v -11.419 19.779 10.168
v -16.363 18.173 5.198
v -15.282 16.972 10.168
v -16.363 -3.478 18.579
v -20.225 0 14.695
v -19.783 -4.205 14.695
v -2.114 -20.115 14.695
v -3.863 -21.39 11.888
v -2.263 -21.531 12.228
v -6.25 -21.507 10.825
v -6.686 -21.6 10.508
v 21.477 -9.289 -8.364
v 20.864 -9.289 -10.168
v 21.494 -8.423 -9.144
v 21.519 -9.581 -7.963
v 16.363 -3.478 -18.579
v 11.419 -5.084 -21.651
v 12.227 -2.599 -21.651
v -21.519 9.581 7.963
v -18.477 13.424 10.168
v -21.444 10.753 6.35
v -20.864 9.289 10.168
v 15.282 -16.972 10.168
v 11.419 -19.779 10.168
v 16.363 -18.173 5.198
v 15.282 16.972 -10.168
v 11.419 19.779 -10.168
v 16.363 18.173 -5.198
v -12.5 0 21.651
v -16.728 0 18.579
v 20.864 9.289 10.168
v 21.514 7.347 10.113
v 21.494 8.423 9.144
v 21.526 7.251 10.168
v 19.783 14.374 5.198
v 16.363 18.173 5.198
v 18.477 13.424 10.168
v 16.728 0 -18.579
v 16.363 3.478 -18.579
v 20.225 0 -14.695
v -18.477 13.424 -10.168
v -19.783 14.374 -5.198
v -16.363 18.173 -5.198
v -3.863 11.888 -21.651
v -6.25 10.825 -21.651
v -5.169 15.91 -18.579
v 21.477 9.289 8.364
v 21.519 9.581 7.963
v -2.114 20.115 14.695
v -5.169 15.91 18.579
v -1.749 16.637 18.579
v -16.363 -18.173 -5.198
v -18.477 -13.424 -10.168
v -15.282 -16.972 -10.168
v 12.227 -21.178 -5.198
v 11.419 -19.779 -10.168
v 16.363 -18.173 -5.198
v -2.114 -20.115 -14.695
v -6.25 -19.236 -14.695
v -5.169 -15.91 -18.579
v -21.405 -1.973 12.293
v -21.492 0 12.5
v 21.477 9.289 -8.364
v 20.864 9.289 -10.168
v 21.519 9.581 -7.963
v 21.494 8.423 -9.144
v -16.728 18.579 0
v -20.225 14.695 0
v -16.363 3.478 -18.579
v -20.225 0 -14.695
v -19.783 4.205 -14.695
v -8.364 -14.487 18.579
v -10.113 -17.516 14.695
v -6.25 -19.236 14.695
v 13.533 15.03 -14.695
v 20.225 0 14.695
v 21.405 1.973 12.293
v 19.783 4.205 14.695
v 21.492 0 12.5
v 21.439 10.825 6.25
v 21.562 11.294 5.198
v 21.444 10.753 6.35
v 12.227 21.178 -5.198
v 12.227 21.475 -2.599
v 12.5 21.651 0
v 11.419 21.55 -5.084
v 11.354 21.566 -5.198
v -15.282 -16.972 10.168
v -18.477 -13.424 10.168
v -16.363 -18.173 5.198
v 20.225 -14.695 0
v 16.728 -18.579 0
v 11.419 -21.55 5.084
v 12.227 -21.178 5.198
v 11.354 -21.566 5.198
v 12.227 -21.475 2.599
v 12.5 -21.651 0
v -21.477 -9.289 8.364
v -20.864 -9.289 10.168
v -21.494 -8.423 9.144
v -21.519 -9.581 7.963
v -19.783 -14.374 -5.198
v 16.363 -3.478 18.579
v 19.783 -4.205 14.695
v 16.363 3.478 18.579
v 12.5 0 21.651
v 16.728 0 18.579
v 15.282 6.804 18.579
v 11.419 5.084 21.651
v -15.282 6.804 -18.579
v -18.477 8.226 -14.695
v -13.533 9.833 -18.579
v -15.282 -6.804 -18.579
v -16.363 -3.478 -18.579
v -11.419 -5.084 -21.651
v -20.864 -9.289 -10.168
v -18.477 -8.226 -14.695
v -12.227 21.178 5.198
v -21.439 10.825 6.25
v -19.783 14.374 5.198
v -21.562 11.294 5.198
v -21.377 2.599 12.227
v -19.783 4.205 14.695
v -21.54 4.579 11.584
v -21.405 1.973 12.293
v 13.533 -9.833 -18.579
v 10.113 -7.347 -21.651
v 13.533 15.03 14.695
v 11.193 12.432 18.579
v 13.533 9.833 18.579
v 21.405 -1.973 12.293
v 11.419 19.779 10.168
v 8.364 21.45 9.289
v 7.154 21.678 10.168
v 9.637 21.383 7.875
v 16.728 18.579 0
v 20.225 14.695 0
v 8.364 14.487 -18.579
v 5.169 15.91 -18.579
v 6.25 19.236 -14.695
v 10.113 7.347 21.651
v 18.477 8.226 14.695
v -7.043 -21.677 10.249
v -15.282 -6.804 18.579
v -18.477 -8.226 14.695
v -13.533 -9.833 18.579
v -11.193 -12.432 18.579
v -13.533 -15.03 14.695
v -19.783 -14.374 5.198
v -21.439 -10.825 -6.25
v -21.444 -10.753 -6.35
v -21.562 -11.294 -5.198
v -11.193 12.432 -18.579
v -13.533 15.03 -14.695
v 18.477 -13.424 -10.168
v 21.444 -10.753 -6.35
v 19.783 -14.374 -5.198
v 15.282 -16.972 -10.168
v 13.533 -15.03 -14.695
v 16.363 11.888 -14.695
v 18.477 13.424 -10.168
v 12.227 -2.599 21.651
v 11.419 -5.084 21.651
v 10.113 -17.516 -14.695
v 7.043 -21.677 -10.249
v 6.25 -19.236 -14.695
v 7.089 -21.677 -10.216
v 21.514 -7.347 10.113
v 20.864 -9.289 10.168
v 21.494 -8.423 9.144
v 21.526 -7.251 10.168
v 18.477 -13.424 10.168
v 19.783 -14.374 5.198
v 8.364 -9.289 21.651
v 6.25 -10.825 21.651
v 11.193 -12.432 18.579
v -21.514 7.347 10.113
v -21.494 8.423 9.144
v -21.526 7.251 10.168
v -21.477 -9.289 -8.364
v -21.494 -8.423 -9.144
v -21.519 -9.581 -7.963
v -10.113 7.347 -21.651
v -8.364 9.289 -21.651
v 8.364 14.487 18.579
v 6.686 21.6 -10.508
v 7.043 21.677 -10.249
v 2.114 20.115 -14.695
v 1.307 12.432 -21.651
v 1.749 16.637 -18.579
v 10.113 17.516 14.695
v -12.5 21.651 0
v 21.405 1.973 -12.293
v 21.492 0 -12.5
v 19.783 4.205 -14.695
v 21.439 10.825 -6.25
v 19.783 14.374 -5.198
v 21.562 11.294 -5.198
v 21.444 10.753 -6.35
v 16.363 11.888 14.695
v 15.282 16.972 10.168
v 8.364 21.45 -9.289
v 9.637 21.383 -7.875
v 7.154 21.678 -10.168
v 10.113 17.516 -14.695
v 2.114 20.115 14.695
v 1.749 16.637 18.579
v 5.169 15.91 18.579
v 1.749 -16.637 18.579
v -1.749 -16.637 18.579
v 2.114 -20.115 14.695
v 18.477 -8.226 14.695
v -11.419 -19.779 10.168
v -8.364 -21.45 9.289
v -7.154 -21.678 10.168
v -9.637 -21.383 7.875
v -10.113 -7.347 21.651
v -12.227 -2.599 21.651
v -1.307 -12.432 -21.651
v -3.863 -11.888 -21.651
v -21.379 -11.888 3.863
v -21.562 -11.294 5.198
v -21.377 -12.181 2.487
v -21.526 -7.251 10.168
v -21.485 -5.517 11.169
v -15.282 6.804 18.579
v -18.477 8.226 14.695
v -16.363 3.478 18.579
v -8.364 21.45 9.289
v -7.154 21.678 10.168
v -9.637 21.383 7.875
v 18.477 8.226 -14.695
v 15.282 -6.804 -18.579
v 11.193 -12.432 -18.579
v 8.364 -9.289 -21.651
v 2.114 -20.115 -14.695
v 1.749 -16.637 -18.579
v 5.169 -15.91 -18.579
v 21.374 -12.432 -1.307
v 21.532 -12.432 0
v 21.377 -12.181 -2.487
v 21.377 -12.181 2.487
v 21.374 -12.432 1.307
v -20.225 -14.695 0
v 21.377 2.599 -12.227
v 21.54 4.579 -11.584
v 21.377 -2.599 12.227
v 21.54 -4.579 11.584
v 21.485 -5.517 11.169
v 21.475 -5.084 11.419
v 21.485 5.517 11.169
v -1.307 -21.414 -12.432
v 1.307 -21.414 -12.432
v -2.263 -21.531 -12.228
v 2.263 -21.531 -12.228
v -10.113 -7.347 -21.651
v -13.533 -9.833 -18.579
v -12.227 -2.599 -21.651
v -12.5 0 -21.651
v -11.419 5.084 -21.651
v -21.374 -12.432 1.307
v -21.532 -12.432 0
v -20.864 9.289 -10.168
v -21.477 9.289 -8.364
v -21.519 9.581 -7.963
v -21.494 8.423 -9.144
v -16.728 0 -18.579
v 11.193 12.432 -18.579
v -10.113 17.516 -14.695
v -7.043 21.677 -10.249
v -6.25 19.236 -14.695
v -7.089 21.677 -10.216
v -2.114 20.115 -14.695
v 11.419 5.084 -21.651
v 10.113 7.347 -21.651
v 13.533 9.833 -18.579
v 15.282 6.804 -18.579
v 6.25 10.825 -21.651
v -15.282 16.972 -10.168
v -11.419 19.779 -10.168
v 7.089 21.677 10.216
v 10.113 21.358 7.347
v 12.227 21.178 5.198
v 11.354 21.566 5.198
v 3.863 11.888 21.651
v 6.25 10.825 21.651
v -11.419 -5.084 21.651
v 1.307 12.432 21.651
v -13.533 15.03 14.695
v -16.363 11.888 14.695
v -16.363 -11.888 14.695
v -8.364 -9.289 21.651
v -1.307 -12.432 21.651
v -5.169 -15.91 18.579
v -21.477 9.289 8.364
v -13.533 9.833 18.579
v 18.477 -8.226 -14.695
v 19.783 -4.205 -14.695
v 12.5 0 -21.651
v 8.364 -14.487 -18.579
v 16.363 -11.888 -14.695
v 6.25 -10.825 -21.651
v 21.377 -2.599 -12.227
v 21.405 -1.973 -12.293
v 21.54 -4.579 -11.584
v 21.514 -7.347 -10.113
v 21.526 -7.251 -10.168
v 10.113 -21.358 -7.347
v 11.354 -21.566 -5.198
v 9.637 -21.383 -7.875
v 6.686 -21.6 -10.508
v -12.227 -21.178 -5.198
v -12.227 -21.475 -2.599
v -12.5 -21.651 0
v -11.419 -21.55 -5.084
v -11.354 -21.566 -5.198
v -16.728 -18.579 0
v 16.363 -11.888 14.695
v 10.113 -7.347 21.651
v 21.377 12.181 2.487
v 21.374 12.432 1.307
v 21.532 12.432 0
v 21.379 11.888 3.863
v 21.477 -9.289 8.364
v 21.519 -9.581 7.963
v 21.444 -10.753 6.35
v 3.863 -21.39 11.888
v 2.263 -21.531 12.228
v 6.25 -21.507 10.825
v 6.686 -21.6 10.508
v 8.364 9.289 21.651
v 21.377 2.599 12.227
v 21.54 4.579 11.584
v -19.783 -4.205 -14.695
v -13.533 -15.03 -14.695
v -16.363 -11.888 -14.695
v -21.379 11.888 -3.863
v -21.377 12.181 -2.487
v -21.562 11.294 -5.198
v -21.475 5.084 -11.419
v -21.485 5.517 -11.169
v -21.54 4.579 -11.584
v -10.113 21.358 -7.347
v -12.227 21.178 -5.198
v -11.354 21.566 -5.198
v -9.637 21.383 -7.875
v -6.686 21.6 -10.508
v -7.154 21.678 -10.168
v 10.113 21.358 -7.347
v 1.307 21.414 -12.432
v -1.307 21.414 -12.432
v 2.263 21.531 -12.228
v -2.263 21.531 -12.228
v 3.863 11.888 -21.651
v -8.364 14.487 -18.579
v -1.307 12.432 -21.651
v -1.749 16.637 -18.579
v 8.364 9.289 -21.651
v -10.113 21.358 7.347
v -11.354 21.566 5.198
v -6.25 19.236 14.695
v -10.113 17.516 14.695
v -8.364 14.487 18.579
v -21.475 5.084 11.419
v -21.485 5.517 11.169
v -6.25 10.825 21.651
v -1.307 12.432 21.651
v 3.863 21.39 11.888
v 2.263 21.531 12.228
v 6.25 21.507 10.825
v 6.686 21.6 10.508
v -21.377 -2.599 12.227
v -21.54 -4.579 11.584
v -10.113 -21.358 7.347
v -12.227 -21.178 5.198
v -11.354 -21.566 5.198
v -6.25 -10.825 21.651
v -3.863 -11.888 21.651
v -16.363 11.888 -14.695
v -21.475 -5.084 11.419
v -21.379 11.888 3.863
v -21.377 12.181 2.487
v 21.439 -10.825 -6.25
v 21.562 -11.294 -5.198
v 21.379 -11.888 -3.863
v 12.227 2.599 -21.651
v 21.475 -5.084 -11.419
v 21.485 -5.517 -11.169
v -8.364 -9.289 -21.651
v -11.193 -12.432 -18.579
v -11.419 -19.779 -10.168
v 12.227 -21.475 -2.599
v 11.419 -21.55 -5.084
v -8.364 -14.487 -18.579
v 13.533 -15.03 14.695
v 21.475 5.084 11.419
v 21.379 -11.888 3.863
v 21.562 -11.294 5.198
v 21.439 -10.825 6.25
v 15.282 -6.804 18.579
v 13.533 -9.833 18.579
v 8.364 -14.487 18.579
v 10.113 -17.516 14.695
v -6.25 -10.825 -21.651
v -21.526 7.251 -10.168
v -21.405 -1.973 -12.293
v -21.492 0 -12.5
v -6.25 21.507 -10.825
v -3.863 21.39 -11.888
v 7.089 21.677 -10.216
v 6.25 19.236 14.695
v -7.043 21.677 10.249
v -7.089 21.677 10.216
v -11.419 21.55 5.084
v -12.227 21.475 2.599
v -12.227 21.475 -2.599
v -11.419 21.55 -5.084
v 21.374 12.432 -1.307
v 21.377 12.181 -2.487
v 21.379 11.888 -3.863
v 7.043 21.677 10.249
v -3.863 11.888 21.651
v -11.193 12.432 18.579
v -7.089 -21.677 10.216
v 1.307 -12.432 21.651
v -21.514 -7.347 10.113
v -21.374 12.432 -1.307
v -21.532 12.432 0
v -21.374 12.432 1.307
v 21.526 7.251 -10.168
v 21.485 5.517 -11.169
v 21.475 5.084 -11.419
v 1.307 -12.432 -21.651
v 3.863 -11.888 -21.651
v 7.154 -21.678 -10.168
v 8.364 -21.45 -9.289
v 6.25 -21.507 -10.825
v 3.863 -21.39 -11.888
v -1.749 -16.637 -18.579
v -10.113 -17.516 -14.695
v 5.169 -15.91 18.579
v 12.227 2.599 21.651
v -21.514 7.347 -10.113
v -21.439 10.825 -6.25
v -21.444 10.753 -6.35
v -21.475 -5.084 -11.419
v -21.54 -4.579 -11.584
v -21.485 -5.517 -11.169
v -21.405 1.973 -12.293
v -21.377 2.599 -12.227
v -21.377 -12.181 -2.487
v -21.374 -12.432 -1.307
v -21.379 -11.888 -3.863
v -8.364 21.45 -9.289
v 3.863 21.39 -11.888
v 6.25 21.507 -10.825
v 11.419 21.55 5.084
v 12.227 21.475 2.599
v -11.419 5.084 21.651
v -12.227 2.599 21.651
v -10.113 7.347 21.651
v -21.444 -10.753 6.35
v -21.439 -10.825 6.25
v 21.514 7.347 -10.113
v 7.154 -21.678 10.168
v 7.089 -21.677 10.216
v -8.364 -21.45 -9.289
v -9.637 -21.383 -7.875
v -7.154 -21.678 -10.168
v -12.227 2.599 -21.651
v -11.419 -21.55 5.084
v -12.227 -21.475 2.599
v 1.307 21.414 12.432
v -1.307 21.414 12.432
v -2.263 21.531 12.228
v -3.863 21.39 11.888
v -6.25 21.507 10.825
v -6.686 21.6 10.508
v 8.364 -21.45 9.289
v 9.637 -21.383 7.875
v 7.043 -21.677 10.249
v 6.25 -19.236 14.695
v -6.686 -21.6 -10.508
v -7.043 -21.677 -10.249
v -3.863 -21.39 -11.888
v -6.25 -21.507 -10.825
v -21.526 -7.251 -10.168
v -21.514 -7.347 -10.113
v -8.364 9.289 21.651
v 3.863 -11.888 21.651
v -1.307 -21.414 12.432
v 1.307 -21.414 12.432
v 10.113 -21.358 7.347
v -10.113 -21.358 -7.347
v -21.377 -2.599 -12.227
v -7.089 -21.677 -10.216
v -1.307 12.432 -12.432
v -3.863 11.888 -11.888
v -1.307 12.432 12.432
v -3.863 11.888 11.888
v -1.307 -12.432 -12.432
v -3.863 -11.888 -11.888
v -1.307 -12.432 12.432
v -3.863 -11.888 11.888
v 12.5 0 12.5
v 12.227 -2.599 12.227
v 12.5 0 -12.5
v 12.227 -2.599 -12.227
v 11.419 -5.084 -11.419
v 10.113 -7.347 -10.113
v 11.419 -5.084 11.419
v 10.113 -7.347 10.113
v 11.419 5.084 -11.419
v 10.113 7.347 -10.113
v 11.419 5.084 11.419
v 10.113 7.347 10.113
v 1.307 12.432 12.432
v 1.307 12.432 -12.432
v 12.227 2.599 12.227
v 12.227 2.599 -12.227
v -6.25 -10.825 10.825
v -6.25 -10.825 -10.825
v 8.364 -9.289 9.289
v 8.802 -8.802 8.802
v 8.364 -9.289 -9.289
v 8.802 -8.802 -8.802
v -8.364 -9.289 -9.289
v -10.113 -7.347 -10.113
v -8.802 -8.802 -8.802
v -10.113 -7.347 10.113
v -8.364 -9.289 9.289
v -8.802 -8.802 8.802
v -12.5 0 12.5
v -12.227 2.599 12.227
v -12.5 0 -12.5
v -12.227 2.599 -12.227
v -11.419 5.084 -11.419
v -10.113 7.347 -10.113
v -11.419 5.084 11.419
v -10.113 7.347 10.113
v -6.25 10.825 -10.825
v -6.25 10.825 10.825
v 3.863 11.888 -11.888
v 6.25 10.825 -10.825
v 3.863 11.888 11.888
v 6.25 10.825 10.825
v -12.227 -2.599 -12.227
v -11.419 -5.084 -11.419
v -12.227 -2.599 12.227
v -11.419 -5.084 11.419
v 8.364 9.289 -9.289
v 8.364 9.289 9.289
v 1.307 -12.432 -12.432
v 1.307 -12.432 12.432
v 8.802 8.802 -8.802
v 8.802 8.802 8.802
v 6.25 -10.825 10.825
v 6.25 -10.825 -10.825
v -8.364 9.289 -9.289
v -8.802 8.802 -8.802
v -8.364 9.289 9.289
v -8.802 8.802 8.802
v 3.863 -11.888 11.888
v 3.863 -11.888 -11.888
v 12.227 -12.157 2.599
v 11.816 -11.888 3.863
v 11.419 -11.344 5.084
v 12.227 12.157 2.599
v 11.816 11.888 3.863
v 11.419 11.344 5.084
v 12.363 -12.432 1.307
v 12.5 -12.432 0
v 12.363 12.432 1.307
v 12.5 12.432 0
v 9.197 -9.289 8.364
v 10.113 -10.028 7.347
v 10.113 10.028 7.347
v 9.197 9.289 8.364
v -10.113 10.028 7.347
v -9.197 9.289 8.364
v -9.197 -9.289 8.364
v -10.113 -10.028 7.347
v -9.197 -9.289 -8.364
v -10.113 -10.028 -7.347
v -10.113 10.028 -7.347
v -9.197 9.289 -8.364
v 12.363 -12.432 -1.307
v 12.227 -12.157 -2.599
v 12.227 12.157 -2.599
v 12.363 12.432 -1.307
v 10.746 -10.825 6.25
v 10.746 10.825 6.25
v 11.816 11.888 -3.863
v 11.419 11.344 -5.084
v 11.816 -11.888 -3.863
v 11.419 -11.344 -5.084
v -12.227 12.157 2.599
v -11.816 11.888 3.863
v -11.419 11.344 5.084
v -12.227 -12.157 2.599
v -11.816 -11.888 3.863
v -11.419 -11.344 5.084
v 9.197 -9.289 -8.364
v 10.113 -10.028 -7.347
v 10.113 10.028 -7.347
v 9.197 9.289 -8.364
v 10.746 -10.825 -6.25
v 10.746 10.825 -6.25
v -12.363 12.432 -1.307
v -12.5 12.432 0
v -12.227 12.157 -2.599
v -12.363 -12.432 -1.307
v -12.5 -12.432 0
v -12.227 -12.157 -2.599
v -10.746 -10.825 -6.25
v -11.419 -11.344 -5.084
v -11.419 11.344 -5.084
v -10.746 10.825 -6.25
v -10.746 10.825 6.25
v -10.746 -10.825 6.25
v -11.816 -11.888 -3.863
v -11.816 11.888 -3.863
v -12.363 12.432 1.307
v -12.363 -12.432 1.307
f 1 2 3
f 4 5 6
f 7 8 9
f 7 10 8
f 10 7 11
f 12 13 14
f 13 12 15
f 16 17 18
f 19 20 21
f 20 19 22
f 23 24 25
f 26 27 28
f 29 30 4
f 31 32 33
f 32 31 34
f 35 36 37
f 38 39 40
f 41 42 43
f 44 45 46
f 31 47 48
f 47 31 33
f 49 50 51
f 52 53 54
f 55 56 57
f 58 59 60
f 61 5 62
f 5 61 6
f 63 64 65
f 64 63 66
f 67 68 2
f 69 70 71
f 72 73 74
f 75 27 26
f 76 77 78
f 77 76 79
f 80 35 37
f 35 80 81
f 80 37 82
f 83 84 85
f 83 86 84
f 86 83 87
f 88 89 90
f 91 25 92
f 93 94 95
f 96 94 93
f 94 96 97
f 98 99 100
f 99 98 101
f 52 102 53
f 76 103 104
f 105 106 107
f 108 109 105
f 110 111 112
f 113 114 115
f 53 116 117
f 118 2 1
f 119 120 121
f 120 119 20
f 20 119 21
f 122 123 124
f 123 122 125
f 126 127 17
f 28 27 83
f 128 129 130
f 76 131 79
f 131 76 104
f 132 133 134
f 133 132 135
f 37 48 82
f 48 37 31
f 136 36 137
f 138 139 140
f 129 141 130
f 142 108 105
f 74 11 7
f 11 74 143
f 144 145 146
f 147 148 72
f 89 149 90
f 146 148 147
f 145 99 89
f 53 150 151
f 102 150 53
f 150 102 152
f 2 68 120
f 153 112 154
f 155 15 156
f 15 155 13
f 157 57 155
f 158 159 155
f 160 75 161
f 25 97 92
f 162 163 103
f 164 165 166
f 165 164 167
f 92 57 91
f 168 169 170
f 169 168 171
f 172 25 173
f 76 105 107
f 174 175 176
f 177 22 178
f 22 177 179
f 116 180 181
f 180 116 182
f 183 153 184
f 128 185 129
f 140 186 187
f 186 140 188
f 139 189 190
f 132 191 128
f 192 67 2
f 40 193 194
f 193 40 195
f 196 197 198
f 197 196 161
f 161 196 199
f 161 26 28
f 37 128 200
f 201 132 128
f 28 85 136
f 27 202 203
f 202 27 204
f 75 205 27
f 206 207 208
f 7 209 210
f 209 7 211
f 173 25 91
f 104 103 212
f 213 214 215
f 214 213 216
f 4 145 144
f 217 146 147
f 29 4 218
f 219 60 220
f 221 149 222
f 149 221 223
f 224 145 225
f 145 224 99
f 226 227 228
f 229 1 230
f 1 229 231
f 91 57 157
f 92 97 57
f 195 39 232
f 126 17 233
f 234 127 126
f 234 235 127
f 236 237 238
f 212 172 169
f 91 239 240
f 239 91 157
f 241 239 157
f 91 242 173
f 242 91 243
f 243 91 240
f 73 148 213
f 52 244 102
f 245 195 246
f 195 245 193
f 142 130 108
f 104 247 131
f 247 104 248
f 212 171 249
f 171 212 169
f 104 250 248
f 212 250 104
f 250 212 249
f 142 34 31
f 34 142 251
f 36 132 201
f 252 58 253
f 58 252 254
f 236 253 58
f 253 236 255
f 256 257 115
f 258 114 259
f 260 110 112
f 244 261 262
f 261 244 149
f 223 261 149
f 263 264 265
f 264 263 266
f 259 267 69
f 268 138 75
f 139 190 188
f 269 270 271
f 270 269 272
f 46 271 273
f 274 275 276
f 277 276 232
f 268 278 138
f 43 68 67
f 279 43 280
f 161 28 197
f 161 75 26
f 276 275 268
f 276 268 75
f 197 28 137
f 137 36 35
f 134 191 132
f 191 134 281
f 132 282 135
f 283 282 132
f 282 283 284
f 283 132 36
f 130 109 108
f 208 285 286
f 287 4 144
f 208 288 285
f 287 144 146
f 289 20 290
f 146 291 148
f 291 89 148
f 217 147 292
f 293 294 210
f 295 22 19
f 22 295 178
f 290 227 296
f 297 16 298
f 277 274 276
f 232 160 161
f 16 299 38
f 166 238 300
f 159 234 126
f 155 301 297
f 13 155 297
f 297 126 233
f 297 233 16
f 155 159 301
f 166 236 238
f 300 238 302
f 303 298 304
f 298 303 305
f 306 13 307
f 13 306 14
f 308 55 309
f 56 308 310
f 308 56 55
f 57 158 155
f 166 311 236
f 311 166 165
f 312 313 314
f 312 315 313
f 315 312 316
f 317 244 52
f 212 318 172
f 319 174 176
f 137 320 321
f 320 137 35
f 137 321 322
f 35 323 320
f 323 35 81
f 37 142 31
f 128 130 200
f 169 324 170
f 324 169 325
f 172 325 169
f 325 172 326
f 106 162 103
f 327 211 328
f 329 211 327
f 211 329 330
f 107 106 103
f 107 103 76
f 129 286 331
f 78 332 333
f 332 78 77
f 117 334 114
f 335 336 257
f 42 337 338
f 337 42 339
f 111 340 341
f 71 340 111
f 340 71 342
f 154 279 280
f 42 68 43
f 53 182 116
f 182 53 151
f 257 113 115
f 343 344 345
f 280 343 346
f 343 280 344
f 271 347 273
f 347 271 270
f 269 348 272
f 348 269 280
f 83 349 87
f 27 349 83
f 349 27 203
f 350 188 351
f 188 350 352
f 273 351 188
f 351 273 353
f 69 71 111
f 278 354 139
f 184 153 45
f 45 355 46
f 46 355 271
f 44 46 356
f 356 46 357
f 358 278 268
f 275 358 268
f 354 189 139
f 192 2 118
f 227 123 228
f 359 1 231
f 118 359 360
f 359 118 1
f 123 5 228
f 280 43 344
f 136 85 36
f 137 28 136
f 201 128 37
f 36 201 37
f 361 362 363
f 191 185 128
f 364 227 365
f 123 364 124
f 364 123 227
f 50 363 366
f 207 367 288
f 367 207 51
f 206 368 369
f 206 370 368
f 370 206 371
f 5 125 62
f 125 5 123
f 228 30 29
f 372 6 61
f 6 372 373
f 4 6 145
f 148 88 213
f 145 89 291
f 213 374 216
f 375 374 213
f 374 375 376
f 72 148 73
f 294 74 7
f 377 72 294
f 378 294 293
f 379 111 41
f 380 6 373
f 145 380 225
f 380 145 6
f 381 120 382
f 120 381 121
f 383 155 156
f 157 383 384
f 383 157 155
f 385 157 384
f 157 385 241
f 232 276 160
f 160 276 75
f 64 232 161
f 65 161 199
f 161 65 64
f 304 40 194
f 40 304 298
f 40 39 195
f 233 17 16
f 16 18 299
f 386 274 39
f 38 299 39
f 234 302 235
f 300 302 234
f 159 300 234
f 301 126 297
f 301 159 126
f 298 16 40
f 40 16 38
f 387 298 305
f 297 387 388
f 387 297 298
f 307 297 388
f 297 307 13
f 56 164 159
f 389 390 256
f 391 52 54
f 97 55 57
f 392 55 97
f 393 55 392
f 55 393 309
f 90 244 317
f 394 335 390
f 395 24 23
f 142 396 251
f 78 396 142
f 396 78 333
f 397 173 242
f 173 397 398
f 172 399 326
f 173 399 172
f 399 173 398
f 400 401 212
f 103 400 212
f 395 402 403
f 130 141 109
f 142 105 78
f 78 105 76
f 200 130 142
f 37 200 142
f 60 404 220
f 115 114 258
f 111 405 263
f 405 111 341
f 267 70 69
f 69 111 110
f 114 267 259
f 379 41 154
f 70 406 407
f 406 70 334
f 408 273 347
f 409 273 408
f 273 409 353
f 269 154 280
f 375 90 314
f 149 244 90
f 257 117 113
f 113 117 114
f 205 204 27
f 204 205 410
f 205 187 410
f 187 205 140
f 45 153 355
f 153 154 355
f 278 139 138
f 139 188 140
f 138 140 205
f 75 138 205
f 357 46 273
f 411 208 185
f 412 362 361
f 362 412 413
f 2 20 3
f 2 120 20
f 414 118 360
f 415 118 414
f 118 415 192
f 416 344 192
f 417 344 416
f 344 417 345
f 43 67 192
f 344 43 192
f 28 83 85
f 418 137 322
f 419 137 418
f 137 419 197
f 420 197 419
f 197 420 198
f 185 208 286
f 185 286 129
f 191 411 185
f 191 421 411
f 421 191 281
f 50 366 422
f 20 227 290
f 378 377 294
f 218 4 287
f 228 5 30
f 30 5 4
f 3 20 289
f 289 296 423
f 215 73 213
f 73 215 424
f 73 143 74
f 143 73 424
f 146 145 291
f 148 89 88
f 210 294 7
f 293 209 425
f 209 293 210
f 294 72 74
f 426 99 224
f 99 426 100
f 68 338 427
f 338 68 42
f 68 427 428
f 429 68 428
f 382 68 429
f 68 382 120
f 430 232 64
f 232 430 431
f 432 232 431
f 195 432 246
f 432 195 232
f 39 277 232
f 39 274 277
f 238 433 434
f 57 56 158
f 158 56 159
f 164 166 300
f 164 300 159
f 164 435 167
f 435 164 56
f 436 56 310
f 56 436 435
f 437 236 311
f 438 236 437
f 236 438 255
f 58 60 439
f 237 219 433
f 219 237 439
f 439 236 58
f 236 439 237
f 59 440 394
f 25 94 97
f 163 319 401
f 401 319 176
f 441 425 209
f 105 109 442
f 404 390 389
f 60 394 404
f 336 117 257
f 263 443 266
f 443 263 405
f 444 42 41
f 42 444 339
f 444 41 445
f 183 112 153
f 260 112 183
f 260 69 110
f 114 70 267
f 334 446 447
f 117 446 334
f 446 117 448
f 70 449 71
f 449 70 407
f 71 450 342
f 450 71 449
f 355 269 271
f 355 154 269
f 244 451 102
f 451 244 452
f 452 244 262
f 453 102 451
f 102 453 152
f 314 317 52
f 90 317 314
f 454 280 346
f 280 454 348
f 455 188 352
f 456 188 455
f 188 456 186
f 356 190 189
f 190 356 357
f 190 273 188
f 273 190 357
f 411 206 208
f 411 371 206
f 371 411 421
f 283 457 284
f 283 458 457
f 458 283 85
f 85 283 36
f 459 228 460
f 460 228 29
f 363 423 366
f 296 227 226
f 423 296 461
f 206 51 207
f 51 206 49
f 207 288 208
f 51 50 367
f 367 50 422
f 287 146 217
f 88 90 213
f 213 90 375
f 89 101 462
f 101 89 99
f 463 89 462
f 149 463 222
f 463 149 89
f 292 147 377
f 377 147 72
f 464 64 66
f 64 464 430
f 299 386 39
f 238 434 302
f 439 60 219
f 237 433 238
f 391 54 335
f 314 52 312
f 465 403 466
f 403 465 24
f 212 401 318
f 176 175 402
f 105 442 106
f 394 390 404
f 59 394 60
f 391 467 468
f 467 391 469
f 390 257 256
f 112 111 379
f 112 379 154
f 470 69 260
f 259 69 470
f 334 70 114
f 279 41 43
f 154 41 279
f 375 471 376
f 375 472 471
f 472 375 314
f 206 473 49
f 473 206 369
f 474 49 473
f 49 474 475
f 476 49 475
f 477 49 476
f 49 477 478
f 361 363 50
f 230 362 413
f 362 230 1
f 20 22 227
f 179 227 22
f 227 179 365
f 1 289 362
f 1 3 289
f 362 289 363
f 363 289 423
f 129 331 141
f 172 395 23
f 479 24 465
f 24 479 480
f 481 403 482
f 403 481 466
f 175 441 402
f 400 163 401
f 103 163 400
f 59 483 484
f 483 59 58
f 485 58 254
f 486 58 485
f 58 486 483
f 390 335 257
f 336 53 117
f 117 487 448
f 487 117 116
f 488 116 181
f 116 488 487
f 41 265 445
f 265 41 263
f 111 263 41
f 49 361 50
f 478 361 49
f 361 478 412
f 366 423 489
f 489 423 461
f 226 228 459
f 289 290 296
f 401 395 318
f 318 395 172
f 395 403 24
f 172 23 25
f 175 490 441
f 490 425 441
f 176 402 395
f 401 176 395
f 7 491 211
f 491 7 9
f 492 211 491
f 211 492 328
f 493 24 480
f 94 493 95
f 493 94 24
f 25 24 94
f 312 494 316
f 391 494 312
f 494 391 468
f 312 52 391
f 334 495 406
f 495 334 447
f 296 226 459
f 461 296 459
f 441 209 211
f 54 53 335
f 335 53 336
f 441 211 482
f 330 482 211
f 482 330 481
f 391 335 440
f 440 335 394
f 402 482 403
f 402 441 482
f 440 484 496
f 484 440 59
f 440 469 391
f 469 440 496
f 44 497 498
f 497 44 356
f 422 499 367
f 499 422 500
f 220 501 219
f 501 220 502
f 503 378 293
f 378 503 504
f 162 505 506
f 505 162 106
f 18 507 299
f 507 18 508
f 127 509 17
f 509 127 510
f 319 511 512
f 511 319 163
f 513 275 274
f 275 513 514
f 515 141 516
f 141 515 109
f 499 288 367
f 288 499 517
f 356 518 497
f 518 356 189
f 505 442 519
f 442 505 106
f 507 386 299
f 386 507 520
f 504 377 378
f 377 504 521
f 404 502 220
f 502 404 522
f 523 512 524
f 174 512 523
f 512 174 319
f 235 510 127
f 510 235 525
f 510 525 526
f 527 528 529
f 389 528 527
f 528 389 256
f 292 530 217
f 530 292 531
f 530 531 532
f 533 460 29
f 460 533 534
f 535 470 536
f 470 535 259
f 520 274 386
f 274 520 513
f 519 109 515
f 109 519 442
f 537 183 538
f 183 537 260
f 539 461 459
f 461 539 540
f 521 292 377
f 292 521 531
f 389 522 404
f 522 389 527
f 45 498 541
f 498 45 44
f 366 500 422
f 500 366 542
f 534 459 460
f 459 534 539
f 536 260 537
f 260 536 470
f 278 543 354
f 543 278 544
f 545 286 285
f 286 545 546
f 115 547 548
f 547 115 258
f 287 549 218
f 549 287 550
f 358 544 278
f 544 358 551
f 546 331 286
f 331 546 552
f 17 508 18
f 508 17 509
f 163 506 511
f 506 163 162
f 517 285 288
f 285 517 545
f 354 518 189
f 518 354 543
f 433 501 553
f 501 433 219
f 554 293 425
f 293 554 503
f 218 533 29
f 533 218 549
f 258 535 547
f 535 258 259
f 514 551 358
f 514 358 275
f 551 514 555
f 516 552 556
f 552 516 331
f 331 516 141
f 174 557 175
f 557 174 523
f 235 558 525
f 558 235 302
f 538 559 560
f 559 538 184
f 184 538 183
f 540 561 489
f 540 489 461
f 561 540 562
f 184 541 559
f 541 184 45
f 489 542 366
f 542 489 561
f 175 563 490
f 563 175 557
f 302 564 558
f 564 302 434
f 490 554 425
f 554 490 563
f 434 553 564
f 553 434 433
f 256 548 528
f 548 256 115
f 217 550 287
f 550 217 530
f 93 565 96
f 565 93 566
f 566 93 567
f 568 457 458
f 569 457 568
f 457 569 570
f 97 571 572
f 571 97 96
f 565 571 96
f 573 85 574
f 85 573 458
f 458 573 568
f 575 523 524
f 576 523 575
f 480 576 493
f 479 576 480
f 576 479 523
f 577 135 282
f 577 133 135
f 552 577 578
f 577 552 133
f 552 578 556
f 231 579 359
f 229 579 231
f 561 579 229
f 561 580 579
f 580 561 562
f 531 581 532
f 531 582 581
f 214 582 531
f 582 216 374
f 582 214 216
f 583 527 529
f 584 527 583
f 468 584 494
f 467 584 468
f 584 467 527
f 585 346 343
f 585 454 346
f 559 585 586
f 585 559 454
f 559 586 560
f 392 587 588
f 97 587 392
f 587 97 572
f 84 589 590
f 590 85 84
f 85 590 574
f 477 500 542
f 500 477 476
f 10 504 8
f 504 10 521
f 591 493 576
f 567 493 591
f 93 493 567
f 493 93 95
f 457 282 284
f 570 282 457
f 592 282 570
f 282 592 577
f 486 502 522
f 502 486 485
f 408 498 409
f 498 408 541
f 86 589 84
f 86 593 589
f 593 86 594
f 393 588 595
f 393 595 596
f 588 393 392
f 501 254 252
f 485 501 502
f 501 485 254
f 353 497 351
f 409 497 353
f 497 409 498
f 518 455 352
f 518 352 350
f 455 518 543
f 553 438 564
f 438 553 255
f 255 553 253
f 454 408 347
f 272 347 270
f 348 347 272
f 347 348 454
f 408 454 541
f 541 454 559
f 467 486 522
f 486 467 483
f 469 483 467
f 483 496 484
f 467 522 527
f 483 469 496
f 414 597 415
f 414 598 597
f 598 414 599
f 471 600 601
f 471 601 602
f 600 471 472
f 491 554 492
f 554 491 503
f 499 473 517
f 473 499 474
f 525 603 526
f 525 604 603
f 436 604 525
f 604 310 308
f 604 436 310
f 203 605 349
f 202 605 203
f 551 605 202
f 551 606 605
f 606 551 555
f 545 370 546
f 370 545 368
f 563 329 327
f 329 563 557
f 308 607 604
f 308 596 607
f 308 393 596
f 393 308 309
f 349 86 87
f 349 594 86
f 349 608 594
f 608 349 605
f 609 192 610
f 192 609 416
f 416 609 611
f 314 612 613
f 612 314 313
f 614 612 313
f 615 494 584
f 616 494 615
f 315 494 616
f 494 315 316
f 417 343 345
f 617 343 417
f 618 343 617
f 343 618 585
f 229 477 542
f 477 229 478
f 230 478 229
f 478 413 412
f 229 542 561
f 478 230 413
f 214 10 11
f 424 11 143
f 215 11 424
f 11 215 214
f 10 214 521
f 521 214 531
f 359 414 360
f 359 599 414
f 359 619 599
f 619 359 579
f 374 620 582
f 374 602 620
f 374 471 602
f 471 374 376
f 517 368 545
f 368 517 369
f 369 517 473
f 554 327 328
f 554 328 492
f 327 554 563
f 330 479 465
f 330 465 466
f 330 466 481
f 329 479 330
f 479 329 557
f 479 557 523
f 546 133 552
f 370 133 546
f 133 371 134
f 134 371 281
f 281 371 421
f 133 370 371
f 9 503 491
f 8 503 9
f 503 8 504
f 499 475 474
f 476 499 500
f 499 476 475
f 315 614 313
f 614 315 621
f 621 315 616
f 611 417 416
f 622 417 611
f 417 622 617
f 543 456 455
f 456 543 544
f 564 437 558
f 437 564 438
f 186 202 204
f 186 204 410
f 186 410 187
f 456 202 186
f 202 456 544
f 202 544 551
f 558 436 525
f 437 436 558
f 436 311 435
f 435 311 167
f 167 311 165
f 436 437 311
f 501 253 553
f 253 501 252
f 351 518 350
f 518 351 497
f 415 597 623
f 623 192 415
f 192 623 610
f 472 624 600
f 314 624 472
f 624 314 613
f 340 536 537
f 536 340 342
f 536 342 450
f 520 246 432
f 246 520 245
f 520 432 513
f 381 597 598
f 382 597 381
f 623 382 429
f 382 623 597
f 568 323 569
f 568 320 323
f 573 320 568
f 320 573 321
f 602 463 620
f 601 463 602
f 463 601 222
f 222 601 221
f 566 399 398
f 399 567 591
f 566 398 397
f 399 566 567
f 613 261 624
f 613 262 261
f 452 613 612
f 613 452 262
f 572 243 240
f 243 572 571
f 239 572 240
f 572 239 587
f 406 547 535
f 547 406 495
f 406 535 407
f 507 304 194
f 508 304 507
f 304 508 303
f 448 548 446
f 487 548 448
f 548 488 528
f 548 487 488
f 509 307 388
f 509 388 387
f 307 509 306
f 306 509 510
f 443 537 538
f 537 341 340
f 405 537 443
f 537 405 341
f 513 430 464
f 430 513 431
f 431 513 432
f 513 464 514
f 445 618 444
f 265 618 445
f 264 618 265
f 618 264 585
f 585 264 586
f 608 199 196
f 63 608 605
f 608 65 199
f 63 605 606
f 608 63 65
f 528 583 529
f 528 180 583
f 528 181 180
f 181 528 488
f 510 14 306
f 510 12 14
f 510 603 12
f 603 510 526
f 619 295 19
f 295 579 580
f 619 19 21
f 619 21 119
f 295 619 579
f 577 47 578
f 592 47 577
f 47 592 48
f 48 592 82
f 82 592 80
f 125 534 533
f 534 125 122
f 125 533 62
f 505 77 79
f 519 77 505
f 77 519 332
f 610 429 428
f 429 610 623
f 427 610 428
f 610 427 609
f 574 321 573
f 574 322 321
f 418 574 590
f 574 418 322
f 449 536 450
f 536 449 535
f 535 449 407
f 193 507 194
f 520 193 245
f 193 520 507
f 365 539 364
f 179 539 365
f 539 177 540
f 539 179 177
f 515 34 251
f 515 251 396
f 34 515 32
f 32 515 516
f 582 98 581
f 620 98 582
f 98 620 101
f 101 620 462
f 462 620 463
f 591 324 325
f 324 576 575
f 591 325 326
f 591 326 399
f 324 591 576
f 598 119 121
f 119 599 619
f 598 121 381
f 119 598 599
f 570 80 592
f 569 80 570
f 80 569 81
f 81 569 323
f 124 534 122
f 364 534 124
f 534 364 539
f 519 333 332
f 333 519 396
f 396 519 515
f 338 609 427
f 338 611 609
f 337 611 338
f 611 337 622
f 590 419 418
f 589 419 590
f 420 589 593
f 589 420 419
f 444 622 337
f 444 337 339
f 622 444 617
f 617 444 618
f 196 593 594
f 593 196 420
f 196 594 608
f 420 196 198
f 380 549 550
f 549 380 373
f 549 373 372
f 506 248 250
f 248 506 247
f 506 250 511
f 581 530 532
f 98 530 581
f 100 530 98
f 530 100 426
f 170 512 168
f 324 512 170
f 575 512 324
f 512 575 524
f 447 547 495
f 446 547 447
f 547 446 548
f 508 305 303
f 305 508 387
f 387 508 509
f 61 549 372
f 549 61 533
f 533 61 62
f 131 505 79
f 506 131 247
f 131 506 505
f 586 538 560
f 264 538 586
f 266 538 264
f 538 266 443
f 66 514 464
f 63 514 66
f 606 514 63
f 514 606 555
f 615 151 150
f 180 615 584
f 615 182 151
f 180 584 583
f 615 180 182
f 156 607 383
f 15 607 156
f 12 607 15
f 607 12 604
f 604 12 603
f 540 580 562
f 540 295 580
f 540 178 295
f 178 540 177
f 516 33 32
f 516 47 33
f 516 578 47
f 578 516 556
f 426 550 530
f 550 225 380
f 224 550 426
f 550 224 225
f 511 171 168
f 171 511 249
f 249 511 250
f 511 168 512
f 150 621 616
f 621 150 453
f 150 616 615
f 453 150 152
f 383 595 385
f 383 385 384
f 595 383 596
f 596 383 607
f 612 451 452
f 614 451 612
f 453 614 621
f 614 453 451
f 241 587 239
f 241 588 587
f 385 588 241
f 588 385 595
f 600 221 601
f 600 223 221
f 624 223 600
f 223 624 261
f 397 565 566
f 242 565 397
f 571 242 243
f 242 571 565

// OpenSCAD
difference(){sphere(r = 25.000);
cylinder(h = 125.000, center = true, r = 12.500);
rotate(a = [90, 0, 0])
cylinder(h = 125.000, center = true, r = 12.500);
rotate(a = [0, 90, 0])
cylinder(h = 125.000, center = true, r = 12.500);
}
